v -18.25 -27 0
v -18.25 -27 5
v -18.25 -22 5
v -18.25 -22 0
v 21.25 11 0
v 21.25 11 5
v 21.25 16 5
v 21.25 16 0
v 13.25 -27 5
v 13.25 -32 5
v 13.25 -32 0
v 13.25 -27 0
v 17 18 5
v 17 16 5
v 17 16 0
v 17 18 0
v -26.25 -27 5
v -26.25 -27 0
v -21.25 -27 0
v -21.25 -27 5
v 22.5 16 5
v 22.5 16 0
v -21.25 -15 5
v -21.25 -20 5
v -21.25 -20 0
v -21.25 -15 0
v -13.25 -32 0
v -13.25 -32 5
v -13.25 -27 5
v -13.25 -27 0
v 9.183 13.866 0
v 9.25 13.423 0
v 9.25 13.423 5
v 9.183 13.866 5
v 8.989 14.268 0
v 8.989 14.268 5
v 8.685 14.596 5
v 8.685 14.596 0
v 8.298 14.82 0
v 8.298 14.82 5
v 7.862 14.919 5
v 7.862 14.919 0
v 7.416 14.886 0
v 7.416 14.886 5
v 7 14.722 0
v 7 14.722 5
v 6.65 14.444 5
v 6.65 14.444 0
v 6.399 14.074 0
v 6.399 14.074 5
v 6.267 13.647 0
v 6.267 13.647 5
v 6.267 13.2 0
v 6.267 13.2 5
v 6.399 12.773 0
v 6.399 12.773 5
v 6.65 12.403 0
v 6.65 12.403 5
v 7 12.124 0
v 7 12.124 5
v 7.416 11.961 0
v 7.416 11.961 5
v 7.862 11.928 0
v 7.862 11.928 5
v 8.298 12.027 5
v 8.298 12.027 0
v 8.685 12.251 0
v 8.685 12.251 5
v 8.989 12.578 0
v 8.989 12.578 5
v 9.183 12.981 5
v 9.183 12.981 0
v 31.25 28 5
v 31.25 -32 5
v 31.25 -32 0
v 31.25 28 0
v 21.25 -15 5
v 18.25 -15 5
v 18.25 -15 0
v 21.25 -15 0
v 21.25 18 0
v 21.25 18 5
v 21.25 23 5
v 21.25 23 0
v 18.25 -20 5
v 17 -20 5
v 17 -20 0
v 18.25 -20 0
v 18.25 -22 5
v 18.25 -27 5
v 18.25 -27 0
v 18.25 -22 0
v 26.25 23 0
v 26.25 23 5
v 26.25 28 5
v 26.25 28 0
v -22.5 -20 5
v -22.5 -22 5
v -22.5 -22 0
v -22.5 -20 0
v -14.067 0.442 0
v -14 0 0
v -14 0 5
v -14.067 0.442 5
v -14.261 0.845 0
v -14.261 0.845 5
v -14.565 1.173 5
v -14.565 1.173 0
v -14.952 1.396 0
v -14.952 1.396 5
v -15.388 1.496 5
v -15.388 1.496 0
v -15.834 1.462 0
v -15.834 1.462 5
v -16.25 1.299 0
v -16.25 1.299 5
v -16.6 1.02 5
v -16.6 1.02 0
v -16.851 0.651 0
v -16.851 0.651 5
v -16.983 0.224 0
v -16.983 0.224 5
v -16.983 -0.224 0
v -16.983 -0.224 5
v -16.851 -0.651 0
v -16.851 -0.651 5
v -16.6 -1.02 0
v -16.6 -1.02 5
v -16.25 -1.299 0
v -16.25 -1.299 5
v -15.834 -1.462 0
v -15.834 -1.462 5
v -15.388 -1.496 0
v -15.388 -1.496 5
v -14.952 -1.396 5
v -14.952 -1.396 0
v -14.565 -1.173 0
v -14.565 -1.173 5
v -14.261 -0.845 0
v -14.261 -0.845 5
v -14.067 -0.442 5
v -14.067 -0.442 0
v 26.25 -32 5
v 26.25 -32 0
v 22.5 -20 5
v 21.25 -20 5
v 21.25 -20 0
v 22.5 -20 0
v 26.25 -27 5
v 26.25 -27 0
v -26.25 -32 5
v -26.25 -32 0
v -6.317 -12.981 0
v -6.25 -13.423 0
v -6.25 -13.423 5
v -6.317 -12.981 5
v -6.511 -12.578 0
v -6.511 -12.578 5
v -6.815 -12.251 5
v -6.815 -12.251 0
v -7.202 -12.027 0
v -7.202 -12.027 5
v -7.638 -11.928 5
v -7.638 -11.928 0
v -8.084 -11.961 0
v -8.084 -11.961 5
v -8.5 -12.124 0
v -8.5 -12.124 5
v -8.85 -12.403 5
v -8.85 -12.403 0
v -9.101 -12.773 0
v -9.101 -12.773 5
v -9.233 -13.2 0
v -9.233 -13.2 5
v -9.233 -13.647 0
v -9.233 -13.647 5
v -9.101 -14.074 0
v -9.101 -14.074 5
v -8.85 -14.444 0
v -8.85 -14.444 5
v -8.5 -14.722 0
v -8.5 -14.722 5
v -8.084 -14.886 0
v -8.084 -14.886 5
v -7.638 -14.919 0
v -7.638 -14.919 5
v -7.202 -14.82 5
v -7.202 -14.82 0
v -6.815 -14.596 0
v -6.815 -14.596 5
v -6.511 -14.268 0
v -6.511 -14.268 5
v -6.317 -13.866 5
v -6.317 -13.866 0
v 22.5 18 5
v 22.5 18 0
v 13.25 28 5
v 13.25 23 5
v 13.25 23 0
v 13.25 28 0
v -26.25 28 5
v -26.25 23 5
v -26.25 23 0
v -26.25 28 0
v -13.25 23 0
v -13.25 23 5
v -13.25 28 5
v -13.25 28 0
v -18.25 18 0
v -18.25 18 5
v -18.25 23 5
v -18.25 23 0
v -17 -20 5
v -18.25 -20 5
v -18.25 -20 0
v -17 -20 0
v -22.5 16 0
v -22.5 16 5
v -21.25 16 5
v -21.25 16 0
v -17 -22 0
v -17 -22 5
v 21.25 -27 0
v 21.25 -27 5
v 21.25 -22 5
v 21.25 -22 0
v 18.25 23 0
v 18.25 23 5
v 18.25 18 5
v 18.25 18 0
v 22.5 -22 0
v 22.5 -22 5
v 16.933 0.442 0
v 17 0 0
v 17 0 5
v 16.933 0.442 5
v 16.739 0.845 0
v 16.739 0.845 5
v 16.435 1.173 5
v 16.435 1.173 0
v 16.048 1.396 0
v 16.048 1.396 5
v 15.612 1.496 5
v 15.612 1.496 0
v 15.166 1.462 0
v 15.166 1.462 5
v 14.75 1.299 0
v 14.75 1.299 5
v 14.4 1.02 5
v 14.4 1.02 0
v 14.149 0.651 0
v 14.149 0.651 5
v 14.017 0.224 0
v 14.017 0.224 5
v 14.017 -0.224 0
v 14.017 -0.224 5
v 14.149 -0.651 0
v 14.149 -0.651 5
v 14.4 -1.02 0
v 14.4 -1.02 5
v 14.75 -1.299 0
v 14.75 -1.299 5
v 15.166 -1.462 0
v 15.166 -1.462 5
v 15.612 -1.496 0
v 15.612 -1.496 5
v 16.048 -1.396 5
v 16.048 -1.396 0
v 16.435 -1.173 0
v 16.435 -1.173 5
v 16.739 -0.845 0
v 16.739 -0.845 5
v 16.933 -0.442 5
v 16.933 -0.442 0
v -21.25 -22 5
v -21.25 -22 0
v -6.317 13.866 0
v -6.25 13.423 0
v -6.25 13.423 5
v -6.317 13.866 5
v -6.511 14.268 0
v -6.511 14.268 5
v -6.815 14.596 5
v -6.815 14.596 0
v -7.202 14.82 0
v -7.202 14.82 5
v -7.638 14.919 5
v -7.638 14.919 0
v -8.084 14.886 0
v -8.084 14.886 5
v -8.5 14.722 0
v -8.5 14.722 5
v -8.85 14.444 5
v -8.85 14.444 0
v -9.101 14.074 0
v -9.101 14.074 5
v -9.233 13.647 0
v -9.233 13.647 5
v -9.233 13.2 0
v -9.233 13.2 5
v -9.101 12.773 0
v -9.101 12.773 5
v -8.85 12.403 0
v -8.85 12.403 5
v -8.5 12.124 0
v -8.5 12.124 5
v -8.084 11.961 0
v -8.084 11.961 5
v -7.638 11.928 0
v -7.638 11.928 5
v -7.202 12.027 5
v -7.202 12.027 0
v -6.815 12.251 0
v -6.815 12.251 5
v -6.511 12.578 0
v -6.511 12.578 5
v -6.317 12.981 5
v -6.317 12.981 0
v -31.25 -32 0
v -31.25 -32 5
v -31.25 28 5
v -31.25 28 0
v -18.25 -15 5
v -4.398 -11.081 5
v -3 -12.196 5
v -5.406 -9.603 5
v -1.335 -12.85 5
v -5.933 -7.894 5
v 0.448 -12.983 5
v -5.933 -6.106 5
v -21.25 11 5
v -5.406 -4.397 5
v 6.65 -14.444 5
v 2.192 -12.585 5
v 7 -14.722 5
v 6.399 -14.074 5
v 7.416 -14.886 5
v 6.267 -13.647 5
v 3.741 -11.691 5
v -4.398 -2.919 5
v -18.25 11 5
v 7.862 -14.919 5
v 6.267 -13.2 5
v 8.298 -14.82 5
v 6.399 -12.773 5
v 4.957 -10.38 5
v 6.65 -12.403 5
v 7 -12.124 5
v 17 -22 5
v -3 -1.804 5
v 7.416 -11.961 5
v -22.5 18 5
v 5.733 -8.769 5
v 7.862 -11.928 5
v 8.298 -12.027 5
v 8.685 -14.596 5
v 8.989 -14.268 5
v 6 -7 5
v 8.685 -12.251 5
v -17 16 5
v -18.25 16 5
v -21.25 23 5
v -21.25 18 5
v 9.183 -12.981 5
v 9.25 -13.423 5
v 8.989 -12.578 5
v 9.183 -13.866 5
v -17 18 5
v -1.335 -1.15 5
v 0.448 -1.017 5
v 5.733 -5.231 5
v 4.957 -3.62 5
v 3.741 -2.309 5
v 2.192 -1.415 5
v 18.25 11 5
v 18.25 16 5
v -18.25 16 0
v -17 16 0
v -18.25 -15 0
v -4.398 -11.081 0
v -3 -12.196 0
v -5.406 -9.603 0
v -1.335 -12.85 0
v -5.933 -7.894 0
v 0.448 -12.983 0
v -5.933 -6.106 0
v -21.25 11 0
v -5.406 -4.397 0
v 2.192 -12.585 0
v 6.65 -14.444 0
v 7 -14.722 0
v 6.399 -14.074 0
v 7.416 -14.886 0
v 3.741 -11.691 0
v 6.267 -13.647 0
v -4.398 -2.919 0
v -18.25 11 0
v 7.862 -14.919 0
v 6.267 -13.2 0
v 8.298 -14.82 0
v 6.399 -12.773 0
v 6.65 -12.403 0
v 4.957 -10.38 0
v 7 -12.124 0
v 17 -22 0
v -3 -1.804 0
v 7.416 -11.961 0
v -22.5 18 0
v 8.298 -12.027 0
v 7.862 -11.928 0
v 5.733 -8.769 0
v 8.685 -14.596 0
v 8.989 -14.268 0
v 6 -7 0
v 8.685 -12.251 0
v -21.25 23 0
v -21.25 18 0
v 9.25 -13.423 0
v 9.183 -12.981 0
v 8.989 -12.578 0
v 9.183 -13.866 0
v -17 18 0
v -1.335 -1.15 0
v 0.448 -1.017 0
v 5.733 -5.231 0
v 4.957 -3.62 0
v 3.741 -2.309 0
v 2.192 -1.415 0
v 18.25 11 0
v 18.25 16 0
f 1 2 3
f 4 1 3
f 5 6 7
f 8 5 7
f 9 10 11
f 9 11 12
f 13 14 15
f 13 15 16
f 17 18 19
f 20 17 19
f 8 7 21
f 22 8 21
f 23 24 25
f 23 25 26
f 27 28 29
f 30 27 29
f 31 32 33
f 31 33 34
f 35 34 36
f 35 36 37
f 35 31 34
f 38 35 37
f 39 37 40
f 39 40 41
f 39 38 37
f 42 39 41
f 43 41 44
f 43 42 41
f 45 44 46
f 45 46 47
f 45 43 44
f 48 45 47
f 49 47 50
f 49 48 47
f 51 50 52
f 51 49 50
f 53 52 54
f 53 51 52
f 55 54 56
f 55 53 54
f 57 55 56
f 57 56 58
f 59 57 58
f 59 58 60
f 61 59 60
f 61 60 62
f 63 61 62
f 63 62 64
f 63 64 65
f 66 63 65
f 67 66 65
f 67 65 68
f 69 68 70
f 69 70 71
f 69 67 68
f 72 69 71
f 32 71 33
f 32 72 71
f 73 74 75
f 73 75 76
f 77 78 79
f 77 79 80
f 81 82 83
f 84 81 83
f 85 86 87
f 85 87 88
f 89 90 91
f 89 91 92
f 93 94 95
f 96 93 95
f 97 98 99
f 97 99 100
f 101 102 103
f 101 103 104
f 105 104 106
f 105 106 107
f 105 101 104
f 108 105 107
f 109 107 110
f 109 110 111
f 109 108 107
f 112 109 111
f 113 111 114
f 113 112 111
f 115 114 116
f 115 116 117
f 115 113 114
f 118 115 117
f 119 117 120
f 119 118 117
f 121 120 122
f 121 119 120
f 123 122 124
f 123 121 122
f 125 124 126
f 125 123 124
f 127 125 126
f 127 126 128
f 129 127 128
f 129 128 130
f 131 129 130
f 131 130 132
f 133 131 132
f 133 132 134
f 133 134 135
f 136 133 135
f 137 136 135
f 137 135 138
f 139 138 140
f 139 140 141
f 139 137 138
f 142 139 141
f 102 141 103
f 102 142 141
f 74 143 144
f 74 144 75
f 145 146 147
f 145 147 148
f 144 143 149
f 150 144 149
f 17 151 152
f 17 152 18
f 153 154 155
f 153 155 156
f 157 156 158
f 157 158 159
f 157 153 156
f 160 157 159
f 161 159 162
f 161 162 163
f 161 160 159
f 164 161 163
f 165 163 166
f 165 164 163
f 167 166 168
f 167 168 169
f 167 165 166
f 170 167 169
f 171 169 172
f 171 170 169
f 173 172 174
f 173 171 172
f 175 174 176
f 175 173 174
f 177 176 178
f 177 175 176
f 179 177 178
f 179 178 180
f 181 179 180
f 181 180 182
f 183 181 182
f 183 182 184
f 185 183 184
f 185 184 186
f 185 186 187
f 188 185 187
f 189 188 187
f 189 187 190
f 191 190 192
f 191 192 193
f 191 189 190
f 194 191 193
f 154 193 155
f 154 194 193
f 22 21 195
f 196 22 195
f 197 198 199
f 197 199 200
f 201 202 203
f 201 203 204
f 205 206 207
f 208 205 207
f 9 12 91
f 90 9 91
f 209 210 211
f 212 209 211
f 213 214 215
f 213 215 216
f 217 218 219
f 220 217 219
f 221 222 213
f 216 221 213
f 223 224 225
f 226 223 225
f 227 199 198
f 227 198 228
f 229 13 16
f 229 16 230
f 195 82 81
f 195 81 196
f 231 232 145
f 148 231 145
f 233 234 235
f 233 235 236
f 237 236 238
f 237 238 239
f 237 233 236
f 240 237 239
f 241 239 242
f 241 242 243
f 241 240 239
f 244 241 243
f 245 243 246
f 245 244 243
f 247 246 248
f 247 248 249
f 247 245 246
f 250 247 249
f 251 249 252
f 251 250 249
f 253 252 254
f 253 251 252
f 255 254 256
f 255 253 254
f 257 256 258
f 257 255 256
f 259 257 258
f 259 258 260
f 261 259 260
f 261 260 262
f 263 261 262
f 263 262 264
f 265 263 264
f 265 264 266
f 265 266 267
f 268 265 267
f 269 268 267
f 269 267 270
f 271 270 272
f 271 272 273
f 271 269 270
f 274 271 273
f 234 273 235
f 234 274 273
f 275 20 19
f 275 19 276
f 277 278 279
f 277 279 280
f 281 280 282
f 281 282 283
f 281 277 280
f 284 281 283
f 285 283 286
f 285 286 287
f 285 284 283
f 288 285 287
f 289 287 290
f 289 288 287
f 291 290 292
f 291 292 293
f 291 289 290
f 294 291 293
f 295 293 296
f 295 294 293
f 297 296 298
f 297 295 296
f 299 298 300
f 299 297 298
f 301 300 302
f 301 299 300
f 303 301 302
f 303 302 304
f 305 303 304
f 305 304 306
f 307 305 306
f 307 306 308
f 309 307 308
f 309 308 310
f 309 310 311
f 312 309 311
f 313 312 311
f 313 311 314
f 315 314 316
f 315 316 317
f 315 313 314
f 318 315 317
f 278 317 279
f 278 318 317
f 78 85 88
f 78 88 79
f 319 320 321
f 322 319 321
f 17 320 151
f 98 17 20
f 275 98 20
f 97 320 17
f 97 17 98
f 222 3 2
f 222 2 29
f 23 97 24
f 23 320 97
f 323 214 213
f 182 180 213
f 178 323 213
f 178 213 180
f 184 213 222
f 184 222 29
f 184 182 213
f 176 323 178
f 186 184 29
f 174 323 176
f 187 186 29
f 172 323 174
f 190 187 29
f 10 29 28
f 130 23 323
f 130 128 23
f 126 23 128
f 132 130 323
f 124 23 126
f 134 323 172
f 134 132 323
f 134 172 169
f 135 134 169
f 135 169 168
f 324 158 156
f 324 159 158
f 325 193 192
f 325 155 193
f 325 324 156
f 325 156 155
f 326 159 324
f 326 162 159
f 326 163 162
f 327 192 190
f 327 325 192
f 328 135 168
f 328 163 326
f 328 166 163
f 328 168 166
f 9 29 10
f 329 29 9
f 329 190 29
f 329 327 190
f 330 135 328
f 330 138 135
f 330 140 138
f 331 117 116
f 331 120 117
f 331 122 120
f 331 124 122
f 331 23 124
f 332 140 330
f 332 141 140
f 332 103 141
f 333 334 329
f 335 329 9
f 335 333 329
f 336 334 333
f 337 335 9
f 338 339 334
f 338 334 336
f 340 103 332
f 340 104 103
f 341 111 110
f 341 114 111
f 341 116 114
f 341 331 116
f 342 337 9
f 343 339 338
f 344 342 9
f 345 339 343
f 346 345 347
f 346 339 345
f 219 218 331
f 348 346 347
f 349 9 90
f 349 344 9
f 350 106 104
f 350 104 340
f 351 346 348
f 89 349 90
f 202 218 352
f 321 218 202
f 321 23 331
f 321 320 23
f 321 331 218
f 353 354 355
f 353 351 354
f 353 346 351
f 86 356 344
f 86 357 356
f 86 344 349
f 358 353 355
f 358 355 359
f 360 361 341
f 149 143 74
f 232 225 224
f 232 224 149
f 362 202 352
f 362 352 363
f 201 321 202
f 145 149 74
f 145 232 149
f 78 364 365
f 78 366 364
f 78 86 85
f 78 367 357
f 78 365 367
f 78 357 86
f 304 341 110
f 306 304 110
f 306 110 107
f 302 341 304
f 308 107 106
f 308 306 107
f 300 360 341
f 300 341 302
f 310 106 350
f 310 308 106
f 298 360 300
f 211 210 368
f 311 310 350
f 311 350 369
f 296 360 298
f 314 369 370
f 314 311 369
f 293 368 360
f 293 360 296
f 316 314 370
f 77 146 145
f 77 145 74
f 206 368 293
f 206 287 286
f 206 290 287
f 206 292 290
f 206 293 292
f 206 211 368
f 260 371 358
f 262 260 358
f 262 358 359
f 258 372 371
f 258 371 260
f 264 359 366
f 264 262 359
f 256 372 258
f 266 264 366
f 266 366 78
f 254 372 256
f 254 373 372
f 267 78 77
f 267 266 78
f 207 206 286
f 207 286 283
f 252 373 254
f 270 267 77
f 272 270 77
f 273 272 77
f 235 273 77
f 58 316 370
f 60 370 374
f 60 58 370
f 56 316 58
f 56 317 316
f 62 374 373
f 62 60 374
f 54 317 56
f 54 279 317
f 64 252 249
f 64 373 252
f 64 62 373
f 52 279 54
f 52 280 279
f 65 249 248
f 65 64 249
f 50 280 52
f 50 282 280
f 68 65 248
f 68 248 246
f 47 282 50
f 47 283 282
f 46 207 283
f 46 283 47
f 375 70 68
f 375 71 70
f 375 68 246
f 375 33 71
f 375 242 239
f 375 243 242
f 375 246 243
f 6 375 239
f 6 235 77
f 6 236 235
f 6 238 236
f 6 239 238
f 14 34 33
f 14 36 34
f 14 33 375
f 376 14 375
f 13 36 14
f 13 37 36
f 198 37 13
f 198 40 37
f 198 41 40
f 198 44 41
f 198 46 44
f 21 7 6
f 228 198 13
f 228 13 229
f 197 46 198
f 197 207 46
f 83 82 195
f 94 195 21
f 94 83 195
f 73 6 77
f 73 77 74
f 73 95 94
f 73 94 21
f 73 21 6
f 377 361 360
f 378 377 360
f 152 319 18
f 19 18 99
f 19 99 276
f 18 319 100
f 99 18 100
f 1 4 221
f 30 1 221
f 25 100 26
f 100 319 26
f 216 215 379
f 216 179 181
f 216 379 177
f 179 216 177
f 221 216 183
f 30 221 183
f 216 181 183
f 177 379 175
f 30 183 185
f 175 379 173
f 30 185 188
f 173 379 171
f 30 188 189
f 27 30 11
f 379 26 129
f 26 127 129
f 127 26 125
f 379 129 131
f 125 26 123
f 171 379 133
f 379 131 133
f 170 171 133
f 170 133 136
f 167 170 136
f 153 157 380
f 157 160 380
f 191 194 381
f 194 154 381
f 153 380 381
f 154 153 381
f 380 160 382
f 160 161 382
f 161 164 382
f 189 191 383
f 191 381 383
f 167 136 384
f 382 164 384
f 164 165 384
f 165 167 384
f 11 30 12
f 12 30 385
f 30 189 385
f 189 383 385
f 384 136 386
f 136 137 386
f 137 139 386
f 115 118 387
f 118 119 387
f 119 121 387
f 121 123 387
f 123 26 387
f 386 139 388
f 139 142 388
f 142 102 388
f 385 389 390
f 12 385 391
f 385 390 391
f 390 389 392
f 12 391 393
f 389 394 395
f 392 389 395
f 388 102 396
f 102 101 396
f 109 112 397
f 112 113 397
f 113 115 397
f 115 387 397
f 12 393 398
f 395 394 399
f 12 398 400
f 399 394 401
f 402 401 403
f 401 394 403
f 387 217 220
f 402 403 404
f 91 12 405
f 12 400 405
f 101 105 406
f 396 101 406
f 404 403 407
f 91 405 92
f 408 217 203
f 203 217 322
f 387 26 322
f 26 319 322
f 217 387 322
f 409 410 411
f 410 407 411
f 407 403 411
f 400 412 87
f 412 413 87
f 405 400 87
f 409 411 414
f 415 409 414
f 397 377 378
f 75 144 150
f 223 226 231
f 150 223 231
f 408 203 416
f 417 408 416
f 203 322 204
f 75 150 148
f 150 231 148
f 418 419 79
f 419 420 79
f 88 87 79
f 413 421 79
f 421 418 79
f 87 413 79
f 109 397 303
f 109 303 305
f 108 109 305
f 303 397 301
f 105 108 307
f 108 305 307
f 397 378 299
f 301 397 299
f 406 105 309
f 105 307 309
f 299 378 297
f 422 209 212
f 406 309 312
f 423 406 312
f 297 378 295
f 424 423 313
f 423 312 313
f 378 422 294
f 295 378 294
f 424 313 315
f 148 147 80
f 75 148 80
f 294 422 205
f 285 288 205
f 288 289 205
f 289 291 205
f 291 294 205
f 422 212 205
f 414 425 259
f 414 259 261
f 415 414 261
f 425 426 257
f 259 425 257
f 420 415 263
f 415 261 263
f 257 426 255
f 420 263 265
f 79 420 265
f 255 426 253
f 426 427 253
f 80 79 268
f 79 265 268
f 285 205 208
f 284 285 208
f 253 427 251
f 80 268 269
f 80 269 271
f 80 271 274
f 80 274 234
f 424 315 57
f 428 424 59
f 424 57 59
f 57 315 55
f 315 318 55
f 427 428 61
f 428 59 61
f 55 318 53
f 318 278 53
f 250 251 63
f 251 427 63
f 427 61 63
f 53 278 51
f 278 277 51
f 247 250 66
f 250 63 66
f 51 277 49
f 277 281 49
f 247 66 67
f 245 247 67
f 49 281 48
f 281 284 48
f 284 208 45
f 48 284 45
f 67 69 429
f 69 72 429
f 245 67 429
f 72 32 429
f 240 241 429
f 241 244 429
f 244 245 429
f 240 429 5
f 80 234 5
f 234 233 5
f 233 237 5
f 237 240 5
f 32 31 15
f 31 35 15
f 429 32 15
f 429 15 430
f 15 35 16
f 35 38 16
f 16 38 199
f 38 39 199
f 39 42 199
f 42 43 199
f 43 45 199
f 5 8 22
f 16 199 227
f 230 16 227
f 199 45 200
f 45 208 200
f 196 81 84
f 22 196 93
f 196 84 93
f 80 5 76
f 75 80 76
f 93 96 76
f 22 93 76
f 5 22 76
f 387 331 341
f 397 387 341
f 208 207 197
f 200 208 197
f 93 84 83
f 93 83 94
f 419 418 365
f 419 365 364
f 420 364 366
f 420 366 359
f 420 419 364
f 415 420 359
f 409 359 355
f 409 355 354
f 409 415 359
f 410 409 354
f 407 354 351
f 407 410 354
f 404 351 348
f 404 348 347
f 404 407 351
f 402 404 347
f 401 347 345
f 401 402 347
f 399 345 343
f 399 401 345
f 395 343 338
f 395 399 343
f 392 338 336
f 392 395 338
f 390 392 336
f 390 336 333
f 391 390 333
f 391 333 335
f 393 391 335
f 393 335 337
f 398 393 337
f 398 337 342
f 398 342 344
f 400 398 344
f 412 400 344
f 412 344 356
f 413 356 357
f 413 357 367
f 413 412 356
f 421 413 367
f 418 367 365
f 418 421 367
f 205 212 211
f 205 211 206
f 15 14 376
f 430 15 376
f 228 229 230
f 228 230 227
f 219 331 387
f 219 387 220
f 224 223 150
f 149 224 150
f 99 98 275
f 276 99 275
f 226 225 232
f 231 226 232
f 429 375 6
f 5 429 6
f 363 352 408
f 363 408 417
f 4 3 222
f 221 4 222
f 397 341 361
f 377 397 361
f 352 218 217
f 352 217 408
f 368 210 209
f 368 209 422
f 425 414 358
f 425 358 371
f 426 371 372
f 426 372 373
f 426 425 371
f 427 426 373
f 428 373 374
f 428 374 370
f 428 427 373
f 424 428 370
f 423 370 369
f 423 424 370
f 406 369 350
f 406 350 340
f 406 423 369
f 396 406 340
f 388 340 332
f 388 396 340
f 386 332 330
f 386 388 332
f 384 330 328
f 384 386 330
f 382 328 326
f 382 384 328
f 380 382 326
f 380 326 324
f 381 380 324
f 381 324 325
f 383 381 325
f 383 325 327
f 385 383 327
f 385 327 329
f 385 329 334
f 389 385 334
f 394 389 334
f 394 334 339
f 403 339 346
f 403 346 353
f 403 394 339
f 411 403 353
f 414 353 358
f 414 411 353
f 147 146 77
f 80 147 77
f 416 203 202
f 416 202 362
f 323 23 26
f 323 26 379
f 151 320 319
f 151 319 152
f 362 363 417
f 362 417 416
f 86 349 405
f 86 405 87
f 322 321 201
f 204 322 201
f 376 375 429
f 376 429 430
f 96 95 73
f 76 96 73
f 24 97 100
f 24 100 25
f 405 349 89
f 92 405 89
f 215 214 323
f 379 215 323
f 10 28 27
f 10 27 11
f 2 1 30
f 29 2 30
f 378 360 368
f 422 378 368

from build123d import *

# Parameters (mm, degrees)
SKETCH1_W           = 55
SKETCH1_H           = 50
SKETCH1_R           = 6
SKETCH1_R_2         = 1.5
BOSS_EXTRUDE1_DEPTH = 5
SKETCH2_W           = 5.5
SKETCH2_H           = 2
SKETCH2_W_2         = 3
SKETCH2_H_2         = 12
CUT_EXTRUDE1_DEPTH  = 5
SKETCH3_W           = 5
SKETCH3_H           = 60
SKETCH3_W_2         = 26.5
SKETCH3_H_2         = 5
BOSS_EXTRUDE2_DEPTH = 5


with BuildPart() as part:
    # Sketch1 → Boss-Extrude1 (new body)
    with BuildSketch(Plane.XY):
        with Locations((0, -2)):
            Rectangle(SKETCH1_W, SKETCH1_H)
        with Locations((0, -7)):
            Circle(SKETCH1_R, mode=Mode.SUBTRACT)
        with Locations((-15.5, 0)):
            Circle(SKETCH1_R_2, mode=Mode.SUBTRACT)
        with Locations((-7.75, 13.423393759)):
            Circle(SKETCH1_R_2, mode=Mode.SUBTRACT)
        with Locations((7.75, 13.423393759)):
            Circle(SKETCH1_R_2, mode=Mode.SUBTRACT)
        with Locations((15.5, 0)):
            Circle(SKETCH1_R_2, mode=Mode.SUBTRACT)
        with Locations((7.75, -13.423393759)):
            Circle(SKETCH1_R_2, mode=Mode.SUBTRACT)
        with Locations((-7.75, -13.423393759)):
            Circle(SKETCH1_R_2, mode=Mode.SUBTRACT)
    extrude(amount=BOSS_EXTRUDE1_DEPTH)

    # Sketch2 → Cut-Extrude1 (cut)
    with BuildSketch(Plane.XY.offset(5)):
        with Locations((-19.75, -21)):
            Rectangle(SKETCH2_W, SKETCH2_H)
        with Locations((19.75, -21)):
            Rectangle(SKETCH2_W, SKETCH2_H)
        with Locations((-19.75, -21)):
            Rectangle(SKETCH2_W_2, SKETCH2_H_2)
        with Locations((19.75, -21)):
            Rectangle(SKETCH2_W_2, SKETCH2_H_2)
        with Locations((19.75, 17)):
            Rectangle(SKETCH2_W_2, SKETCH2_H_2)
        with Locations((-19.75, 17)):
            Rectangle(SKETCH2_W_2, SKETCH2_H_2)
        with Locations((19.75, 17)):
            Rectangle(SKETCH2_W, SKETCH2_H)
        with Locations((-19.75, 17)):
            Rectangle(SKETCH2_W, SKETCH2_H)
    extrude(amount=-CUT_EXTRUDE1_DEPTH, mode=Mode.SUBTRACT)

    # Sketch3 → Boss-Extrude2 (add)
    with BuildSketch(Plane.XY.offset(5)):
        with Locations((-28.75, -2)):
            Rectangle(SKETCH3_W, SKETCH3_H)
        with Locations((0, -29.5)):
            Rectangle(SKETCH3_W_2, SKETCH3_H_2)
        with Locations((28.75, -2)):
            Rectangle(SKETCH3_W, SKETCH3_H)
        with Locations((0, 25.5)):
            Rectangle(SKETCH3_W_2, SKETCH3_H_2)
    extrude(amount=-BOSS_EXTRUDE2_DEPTH)


solid = part.part
